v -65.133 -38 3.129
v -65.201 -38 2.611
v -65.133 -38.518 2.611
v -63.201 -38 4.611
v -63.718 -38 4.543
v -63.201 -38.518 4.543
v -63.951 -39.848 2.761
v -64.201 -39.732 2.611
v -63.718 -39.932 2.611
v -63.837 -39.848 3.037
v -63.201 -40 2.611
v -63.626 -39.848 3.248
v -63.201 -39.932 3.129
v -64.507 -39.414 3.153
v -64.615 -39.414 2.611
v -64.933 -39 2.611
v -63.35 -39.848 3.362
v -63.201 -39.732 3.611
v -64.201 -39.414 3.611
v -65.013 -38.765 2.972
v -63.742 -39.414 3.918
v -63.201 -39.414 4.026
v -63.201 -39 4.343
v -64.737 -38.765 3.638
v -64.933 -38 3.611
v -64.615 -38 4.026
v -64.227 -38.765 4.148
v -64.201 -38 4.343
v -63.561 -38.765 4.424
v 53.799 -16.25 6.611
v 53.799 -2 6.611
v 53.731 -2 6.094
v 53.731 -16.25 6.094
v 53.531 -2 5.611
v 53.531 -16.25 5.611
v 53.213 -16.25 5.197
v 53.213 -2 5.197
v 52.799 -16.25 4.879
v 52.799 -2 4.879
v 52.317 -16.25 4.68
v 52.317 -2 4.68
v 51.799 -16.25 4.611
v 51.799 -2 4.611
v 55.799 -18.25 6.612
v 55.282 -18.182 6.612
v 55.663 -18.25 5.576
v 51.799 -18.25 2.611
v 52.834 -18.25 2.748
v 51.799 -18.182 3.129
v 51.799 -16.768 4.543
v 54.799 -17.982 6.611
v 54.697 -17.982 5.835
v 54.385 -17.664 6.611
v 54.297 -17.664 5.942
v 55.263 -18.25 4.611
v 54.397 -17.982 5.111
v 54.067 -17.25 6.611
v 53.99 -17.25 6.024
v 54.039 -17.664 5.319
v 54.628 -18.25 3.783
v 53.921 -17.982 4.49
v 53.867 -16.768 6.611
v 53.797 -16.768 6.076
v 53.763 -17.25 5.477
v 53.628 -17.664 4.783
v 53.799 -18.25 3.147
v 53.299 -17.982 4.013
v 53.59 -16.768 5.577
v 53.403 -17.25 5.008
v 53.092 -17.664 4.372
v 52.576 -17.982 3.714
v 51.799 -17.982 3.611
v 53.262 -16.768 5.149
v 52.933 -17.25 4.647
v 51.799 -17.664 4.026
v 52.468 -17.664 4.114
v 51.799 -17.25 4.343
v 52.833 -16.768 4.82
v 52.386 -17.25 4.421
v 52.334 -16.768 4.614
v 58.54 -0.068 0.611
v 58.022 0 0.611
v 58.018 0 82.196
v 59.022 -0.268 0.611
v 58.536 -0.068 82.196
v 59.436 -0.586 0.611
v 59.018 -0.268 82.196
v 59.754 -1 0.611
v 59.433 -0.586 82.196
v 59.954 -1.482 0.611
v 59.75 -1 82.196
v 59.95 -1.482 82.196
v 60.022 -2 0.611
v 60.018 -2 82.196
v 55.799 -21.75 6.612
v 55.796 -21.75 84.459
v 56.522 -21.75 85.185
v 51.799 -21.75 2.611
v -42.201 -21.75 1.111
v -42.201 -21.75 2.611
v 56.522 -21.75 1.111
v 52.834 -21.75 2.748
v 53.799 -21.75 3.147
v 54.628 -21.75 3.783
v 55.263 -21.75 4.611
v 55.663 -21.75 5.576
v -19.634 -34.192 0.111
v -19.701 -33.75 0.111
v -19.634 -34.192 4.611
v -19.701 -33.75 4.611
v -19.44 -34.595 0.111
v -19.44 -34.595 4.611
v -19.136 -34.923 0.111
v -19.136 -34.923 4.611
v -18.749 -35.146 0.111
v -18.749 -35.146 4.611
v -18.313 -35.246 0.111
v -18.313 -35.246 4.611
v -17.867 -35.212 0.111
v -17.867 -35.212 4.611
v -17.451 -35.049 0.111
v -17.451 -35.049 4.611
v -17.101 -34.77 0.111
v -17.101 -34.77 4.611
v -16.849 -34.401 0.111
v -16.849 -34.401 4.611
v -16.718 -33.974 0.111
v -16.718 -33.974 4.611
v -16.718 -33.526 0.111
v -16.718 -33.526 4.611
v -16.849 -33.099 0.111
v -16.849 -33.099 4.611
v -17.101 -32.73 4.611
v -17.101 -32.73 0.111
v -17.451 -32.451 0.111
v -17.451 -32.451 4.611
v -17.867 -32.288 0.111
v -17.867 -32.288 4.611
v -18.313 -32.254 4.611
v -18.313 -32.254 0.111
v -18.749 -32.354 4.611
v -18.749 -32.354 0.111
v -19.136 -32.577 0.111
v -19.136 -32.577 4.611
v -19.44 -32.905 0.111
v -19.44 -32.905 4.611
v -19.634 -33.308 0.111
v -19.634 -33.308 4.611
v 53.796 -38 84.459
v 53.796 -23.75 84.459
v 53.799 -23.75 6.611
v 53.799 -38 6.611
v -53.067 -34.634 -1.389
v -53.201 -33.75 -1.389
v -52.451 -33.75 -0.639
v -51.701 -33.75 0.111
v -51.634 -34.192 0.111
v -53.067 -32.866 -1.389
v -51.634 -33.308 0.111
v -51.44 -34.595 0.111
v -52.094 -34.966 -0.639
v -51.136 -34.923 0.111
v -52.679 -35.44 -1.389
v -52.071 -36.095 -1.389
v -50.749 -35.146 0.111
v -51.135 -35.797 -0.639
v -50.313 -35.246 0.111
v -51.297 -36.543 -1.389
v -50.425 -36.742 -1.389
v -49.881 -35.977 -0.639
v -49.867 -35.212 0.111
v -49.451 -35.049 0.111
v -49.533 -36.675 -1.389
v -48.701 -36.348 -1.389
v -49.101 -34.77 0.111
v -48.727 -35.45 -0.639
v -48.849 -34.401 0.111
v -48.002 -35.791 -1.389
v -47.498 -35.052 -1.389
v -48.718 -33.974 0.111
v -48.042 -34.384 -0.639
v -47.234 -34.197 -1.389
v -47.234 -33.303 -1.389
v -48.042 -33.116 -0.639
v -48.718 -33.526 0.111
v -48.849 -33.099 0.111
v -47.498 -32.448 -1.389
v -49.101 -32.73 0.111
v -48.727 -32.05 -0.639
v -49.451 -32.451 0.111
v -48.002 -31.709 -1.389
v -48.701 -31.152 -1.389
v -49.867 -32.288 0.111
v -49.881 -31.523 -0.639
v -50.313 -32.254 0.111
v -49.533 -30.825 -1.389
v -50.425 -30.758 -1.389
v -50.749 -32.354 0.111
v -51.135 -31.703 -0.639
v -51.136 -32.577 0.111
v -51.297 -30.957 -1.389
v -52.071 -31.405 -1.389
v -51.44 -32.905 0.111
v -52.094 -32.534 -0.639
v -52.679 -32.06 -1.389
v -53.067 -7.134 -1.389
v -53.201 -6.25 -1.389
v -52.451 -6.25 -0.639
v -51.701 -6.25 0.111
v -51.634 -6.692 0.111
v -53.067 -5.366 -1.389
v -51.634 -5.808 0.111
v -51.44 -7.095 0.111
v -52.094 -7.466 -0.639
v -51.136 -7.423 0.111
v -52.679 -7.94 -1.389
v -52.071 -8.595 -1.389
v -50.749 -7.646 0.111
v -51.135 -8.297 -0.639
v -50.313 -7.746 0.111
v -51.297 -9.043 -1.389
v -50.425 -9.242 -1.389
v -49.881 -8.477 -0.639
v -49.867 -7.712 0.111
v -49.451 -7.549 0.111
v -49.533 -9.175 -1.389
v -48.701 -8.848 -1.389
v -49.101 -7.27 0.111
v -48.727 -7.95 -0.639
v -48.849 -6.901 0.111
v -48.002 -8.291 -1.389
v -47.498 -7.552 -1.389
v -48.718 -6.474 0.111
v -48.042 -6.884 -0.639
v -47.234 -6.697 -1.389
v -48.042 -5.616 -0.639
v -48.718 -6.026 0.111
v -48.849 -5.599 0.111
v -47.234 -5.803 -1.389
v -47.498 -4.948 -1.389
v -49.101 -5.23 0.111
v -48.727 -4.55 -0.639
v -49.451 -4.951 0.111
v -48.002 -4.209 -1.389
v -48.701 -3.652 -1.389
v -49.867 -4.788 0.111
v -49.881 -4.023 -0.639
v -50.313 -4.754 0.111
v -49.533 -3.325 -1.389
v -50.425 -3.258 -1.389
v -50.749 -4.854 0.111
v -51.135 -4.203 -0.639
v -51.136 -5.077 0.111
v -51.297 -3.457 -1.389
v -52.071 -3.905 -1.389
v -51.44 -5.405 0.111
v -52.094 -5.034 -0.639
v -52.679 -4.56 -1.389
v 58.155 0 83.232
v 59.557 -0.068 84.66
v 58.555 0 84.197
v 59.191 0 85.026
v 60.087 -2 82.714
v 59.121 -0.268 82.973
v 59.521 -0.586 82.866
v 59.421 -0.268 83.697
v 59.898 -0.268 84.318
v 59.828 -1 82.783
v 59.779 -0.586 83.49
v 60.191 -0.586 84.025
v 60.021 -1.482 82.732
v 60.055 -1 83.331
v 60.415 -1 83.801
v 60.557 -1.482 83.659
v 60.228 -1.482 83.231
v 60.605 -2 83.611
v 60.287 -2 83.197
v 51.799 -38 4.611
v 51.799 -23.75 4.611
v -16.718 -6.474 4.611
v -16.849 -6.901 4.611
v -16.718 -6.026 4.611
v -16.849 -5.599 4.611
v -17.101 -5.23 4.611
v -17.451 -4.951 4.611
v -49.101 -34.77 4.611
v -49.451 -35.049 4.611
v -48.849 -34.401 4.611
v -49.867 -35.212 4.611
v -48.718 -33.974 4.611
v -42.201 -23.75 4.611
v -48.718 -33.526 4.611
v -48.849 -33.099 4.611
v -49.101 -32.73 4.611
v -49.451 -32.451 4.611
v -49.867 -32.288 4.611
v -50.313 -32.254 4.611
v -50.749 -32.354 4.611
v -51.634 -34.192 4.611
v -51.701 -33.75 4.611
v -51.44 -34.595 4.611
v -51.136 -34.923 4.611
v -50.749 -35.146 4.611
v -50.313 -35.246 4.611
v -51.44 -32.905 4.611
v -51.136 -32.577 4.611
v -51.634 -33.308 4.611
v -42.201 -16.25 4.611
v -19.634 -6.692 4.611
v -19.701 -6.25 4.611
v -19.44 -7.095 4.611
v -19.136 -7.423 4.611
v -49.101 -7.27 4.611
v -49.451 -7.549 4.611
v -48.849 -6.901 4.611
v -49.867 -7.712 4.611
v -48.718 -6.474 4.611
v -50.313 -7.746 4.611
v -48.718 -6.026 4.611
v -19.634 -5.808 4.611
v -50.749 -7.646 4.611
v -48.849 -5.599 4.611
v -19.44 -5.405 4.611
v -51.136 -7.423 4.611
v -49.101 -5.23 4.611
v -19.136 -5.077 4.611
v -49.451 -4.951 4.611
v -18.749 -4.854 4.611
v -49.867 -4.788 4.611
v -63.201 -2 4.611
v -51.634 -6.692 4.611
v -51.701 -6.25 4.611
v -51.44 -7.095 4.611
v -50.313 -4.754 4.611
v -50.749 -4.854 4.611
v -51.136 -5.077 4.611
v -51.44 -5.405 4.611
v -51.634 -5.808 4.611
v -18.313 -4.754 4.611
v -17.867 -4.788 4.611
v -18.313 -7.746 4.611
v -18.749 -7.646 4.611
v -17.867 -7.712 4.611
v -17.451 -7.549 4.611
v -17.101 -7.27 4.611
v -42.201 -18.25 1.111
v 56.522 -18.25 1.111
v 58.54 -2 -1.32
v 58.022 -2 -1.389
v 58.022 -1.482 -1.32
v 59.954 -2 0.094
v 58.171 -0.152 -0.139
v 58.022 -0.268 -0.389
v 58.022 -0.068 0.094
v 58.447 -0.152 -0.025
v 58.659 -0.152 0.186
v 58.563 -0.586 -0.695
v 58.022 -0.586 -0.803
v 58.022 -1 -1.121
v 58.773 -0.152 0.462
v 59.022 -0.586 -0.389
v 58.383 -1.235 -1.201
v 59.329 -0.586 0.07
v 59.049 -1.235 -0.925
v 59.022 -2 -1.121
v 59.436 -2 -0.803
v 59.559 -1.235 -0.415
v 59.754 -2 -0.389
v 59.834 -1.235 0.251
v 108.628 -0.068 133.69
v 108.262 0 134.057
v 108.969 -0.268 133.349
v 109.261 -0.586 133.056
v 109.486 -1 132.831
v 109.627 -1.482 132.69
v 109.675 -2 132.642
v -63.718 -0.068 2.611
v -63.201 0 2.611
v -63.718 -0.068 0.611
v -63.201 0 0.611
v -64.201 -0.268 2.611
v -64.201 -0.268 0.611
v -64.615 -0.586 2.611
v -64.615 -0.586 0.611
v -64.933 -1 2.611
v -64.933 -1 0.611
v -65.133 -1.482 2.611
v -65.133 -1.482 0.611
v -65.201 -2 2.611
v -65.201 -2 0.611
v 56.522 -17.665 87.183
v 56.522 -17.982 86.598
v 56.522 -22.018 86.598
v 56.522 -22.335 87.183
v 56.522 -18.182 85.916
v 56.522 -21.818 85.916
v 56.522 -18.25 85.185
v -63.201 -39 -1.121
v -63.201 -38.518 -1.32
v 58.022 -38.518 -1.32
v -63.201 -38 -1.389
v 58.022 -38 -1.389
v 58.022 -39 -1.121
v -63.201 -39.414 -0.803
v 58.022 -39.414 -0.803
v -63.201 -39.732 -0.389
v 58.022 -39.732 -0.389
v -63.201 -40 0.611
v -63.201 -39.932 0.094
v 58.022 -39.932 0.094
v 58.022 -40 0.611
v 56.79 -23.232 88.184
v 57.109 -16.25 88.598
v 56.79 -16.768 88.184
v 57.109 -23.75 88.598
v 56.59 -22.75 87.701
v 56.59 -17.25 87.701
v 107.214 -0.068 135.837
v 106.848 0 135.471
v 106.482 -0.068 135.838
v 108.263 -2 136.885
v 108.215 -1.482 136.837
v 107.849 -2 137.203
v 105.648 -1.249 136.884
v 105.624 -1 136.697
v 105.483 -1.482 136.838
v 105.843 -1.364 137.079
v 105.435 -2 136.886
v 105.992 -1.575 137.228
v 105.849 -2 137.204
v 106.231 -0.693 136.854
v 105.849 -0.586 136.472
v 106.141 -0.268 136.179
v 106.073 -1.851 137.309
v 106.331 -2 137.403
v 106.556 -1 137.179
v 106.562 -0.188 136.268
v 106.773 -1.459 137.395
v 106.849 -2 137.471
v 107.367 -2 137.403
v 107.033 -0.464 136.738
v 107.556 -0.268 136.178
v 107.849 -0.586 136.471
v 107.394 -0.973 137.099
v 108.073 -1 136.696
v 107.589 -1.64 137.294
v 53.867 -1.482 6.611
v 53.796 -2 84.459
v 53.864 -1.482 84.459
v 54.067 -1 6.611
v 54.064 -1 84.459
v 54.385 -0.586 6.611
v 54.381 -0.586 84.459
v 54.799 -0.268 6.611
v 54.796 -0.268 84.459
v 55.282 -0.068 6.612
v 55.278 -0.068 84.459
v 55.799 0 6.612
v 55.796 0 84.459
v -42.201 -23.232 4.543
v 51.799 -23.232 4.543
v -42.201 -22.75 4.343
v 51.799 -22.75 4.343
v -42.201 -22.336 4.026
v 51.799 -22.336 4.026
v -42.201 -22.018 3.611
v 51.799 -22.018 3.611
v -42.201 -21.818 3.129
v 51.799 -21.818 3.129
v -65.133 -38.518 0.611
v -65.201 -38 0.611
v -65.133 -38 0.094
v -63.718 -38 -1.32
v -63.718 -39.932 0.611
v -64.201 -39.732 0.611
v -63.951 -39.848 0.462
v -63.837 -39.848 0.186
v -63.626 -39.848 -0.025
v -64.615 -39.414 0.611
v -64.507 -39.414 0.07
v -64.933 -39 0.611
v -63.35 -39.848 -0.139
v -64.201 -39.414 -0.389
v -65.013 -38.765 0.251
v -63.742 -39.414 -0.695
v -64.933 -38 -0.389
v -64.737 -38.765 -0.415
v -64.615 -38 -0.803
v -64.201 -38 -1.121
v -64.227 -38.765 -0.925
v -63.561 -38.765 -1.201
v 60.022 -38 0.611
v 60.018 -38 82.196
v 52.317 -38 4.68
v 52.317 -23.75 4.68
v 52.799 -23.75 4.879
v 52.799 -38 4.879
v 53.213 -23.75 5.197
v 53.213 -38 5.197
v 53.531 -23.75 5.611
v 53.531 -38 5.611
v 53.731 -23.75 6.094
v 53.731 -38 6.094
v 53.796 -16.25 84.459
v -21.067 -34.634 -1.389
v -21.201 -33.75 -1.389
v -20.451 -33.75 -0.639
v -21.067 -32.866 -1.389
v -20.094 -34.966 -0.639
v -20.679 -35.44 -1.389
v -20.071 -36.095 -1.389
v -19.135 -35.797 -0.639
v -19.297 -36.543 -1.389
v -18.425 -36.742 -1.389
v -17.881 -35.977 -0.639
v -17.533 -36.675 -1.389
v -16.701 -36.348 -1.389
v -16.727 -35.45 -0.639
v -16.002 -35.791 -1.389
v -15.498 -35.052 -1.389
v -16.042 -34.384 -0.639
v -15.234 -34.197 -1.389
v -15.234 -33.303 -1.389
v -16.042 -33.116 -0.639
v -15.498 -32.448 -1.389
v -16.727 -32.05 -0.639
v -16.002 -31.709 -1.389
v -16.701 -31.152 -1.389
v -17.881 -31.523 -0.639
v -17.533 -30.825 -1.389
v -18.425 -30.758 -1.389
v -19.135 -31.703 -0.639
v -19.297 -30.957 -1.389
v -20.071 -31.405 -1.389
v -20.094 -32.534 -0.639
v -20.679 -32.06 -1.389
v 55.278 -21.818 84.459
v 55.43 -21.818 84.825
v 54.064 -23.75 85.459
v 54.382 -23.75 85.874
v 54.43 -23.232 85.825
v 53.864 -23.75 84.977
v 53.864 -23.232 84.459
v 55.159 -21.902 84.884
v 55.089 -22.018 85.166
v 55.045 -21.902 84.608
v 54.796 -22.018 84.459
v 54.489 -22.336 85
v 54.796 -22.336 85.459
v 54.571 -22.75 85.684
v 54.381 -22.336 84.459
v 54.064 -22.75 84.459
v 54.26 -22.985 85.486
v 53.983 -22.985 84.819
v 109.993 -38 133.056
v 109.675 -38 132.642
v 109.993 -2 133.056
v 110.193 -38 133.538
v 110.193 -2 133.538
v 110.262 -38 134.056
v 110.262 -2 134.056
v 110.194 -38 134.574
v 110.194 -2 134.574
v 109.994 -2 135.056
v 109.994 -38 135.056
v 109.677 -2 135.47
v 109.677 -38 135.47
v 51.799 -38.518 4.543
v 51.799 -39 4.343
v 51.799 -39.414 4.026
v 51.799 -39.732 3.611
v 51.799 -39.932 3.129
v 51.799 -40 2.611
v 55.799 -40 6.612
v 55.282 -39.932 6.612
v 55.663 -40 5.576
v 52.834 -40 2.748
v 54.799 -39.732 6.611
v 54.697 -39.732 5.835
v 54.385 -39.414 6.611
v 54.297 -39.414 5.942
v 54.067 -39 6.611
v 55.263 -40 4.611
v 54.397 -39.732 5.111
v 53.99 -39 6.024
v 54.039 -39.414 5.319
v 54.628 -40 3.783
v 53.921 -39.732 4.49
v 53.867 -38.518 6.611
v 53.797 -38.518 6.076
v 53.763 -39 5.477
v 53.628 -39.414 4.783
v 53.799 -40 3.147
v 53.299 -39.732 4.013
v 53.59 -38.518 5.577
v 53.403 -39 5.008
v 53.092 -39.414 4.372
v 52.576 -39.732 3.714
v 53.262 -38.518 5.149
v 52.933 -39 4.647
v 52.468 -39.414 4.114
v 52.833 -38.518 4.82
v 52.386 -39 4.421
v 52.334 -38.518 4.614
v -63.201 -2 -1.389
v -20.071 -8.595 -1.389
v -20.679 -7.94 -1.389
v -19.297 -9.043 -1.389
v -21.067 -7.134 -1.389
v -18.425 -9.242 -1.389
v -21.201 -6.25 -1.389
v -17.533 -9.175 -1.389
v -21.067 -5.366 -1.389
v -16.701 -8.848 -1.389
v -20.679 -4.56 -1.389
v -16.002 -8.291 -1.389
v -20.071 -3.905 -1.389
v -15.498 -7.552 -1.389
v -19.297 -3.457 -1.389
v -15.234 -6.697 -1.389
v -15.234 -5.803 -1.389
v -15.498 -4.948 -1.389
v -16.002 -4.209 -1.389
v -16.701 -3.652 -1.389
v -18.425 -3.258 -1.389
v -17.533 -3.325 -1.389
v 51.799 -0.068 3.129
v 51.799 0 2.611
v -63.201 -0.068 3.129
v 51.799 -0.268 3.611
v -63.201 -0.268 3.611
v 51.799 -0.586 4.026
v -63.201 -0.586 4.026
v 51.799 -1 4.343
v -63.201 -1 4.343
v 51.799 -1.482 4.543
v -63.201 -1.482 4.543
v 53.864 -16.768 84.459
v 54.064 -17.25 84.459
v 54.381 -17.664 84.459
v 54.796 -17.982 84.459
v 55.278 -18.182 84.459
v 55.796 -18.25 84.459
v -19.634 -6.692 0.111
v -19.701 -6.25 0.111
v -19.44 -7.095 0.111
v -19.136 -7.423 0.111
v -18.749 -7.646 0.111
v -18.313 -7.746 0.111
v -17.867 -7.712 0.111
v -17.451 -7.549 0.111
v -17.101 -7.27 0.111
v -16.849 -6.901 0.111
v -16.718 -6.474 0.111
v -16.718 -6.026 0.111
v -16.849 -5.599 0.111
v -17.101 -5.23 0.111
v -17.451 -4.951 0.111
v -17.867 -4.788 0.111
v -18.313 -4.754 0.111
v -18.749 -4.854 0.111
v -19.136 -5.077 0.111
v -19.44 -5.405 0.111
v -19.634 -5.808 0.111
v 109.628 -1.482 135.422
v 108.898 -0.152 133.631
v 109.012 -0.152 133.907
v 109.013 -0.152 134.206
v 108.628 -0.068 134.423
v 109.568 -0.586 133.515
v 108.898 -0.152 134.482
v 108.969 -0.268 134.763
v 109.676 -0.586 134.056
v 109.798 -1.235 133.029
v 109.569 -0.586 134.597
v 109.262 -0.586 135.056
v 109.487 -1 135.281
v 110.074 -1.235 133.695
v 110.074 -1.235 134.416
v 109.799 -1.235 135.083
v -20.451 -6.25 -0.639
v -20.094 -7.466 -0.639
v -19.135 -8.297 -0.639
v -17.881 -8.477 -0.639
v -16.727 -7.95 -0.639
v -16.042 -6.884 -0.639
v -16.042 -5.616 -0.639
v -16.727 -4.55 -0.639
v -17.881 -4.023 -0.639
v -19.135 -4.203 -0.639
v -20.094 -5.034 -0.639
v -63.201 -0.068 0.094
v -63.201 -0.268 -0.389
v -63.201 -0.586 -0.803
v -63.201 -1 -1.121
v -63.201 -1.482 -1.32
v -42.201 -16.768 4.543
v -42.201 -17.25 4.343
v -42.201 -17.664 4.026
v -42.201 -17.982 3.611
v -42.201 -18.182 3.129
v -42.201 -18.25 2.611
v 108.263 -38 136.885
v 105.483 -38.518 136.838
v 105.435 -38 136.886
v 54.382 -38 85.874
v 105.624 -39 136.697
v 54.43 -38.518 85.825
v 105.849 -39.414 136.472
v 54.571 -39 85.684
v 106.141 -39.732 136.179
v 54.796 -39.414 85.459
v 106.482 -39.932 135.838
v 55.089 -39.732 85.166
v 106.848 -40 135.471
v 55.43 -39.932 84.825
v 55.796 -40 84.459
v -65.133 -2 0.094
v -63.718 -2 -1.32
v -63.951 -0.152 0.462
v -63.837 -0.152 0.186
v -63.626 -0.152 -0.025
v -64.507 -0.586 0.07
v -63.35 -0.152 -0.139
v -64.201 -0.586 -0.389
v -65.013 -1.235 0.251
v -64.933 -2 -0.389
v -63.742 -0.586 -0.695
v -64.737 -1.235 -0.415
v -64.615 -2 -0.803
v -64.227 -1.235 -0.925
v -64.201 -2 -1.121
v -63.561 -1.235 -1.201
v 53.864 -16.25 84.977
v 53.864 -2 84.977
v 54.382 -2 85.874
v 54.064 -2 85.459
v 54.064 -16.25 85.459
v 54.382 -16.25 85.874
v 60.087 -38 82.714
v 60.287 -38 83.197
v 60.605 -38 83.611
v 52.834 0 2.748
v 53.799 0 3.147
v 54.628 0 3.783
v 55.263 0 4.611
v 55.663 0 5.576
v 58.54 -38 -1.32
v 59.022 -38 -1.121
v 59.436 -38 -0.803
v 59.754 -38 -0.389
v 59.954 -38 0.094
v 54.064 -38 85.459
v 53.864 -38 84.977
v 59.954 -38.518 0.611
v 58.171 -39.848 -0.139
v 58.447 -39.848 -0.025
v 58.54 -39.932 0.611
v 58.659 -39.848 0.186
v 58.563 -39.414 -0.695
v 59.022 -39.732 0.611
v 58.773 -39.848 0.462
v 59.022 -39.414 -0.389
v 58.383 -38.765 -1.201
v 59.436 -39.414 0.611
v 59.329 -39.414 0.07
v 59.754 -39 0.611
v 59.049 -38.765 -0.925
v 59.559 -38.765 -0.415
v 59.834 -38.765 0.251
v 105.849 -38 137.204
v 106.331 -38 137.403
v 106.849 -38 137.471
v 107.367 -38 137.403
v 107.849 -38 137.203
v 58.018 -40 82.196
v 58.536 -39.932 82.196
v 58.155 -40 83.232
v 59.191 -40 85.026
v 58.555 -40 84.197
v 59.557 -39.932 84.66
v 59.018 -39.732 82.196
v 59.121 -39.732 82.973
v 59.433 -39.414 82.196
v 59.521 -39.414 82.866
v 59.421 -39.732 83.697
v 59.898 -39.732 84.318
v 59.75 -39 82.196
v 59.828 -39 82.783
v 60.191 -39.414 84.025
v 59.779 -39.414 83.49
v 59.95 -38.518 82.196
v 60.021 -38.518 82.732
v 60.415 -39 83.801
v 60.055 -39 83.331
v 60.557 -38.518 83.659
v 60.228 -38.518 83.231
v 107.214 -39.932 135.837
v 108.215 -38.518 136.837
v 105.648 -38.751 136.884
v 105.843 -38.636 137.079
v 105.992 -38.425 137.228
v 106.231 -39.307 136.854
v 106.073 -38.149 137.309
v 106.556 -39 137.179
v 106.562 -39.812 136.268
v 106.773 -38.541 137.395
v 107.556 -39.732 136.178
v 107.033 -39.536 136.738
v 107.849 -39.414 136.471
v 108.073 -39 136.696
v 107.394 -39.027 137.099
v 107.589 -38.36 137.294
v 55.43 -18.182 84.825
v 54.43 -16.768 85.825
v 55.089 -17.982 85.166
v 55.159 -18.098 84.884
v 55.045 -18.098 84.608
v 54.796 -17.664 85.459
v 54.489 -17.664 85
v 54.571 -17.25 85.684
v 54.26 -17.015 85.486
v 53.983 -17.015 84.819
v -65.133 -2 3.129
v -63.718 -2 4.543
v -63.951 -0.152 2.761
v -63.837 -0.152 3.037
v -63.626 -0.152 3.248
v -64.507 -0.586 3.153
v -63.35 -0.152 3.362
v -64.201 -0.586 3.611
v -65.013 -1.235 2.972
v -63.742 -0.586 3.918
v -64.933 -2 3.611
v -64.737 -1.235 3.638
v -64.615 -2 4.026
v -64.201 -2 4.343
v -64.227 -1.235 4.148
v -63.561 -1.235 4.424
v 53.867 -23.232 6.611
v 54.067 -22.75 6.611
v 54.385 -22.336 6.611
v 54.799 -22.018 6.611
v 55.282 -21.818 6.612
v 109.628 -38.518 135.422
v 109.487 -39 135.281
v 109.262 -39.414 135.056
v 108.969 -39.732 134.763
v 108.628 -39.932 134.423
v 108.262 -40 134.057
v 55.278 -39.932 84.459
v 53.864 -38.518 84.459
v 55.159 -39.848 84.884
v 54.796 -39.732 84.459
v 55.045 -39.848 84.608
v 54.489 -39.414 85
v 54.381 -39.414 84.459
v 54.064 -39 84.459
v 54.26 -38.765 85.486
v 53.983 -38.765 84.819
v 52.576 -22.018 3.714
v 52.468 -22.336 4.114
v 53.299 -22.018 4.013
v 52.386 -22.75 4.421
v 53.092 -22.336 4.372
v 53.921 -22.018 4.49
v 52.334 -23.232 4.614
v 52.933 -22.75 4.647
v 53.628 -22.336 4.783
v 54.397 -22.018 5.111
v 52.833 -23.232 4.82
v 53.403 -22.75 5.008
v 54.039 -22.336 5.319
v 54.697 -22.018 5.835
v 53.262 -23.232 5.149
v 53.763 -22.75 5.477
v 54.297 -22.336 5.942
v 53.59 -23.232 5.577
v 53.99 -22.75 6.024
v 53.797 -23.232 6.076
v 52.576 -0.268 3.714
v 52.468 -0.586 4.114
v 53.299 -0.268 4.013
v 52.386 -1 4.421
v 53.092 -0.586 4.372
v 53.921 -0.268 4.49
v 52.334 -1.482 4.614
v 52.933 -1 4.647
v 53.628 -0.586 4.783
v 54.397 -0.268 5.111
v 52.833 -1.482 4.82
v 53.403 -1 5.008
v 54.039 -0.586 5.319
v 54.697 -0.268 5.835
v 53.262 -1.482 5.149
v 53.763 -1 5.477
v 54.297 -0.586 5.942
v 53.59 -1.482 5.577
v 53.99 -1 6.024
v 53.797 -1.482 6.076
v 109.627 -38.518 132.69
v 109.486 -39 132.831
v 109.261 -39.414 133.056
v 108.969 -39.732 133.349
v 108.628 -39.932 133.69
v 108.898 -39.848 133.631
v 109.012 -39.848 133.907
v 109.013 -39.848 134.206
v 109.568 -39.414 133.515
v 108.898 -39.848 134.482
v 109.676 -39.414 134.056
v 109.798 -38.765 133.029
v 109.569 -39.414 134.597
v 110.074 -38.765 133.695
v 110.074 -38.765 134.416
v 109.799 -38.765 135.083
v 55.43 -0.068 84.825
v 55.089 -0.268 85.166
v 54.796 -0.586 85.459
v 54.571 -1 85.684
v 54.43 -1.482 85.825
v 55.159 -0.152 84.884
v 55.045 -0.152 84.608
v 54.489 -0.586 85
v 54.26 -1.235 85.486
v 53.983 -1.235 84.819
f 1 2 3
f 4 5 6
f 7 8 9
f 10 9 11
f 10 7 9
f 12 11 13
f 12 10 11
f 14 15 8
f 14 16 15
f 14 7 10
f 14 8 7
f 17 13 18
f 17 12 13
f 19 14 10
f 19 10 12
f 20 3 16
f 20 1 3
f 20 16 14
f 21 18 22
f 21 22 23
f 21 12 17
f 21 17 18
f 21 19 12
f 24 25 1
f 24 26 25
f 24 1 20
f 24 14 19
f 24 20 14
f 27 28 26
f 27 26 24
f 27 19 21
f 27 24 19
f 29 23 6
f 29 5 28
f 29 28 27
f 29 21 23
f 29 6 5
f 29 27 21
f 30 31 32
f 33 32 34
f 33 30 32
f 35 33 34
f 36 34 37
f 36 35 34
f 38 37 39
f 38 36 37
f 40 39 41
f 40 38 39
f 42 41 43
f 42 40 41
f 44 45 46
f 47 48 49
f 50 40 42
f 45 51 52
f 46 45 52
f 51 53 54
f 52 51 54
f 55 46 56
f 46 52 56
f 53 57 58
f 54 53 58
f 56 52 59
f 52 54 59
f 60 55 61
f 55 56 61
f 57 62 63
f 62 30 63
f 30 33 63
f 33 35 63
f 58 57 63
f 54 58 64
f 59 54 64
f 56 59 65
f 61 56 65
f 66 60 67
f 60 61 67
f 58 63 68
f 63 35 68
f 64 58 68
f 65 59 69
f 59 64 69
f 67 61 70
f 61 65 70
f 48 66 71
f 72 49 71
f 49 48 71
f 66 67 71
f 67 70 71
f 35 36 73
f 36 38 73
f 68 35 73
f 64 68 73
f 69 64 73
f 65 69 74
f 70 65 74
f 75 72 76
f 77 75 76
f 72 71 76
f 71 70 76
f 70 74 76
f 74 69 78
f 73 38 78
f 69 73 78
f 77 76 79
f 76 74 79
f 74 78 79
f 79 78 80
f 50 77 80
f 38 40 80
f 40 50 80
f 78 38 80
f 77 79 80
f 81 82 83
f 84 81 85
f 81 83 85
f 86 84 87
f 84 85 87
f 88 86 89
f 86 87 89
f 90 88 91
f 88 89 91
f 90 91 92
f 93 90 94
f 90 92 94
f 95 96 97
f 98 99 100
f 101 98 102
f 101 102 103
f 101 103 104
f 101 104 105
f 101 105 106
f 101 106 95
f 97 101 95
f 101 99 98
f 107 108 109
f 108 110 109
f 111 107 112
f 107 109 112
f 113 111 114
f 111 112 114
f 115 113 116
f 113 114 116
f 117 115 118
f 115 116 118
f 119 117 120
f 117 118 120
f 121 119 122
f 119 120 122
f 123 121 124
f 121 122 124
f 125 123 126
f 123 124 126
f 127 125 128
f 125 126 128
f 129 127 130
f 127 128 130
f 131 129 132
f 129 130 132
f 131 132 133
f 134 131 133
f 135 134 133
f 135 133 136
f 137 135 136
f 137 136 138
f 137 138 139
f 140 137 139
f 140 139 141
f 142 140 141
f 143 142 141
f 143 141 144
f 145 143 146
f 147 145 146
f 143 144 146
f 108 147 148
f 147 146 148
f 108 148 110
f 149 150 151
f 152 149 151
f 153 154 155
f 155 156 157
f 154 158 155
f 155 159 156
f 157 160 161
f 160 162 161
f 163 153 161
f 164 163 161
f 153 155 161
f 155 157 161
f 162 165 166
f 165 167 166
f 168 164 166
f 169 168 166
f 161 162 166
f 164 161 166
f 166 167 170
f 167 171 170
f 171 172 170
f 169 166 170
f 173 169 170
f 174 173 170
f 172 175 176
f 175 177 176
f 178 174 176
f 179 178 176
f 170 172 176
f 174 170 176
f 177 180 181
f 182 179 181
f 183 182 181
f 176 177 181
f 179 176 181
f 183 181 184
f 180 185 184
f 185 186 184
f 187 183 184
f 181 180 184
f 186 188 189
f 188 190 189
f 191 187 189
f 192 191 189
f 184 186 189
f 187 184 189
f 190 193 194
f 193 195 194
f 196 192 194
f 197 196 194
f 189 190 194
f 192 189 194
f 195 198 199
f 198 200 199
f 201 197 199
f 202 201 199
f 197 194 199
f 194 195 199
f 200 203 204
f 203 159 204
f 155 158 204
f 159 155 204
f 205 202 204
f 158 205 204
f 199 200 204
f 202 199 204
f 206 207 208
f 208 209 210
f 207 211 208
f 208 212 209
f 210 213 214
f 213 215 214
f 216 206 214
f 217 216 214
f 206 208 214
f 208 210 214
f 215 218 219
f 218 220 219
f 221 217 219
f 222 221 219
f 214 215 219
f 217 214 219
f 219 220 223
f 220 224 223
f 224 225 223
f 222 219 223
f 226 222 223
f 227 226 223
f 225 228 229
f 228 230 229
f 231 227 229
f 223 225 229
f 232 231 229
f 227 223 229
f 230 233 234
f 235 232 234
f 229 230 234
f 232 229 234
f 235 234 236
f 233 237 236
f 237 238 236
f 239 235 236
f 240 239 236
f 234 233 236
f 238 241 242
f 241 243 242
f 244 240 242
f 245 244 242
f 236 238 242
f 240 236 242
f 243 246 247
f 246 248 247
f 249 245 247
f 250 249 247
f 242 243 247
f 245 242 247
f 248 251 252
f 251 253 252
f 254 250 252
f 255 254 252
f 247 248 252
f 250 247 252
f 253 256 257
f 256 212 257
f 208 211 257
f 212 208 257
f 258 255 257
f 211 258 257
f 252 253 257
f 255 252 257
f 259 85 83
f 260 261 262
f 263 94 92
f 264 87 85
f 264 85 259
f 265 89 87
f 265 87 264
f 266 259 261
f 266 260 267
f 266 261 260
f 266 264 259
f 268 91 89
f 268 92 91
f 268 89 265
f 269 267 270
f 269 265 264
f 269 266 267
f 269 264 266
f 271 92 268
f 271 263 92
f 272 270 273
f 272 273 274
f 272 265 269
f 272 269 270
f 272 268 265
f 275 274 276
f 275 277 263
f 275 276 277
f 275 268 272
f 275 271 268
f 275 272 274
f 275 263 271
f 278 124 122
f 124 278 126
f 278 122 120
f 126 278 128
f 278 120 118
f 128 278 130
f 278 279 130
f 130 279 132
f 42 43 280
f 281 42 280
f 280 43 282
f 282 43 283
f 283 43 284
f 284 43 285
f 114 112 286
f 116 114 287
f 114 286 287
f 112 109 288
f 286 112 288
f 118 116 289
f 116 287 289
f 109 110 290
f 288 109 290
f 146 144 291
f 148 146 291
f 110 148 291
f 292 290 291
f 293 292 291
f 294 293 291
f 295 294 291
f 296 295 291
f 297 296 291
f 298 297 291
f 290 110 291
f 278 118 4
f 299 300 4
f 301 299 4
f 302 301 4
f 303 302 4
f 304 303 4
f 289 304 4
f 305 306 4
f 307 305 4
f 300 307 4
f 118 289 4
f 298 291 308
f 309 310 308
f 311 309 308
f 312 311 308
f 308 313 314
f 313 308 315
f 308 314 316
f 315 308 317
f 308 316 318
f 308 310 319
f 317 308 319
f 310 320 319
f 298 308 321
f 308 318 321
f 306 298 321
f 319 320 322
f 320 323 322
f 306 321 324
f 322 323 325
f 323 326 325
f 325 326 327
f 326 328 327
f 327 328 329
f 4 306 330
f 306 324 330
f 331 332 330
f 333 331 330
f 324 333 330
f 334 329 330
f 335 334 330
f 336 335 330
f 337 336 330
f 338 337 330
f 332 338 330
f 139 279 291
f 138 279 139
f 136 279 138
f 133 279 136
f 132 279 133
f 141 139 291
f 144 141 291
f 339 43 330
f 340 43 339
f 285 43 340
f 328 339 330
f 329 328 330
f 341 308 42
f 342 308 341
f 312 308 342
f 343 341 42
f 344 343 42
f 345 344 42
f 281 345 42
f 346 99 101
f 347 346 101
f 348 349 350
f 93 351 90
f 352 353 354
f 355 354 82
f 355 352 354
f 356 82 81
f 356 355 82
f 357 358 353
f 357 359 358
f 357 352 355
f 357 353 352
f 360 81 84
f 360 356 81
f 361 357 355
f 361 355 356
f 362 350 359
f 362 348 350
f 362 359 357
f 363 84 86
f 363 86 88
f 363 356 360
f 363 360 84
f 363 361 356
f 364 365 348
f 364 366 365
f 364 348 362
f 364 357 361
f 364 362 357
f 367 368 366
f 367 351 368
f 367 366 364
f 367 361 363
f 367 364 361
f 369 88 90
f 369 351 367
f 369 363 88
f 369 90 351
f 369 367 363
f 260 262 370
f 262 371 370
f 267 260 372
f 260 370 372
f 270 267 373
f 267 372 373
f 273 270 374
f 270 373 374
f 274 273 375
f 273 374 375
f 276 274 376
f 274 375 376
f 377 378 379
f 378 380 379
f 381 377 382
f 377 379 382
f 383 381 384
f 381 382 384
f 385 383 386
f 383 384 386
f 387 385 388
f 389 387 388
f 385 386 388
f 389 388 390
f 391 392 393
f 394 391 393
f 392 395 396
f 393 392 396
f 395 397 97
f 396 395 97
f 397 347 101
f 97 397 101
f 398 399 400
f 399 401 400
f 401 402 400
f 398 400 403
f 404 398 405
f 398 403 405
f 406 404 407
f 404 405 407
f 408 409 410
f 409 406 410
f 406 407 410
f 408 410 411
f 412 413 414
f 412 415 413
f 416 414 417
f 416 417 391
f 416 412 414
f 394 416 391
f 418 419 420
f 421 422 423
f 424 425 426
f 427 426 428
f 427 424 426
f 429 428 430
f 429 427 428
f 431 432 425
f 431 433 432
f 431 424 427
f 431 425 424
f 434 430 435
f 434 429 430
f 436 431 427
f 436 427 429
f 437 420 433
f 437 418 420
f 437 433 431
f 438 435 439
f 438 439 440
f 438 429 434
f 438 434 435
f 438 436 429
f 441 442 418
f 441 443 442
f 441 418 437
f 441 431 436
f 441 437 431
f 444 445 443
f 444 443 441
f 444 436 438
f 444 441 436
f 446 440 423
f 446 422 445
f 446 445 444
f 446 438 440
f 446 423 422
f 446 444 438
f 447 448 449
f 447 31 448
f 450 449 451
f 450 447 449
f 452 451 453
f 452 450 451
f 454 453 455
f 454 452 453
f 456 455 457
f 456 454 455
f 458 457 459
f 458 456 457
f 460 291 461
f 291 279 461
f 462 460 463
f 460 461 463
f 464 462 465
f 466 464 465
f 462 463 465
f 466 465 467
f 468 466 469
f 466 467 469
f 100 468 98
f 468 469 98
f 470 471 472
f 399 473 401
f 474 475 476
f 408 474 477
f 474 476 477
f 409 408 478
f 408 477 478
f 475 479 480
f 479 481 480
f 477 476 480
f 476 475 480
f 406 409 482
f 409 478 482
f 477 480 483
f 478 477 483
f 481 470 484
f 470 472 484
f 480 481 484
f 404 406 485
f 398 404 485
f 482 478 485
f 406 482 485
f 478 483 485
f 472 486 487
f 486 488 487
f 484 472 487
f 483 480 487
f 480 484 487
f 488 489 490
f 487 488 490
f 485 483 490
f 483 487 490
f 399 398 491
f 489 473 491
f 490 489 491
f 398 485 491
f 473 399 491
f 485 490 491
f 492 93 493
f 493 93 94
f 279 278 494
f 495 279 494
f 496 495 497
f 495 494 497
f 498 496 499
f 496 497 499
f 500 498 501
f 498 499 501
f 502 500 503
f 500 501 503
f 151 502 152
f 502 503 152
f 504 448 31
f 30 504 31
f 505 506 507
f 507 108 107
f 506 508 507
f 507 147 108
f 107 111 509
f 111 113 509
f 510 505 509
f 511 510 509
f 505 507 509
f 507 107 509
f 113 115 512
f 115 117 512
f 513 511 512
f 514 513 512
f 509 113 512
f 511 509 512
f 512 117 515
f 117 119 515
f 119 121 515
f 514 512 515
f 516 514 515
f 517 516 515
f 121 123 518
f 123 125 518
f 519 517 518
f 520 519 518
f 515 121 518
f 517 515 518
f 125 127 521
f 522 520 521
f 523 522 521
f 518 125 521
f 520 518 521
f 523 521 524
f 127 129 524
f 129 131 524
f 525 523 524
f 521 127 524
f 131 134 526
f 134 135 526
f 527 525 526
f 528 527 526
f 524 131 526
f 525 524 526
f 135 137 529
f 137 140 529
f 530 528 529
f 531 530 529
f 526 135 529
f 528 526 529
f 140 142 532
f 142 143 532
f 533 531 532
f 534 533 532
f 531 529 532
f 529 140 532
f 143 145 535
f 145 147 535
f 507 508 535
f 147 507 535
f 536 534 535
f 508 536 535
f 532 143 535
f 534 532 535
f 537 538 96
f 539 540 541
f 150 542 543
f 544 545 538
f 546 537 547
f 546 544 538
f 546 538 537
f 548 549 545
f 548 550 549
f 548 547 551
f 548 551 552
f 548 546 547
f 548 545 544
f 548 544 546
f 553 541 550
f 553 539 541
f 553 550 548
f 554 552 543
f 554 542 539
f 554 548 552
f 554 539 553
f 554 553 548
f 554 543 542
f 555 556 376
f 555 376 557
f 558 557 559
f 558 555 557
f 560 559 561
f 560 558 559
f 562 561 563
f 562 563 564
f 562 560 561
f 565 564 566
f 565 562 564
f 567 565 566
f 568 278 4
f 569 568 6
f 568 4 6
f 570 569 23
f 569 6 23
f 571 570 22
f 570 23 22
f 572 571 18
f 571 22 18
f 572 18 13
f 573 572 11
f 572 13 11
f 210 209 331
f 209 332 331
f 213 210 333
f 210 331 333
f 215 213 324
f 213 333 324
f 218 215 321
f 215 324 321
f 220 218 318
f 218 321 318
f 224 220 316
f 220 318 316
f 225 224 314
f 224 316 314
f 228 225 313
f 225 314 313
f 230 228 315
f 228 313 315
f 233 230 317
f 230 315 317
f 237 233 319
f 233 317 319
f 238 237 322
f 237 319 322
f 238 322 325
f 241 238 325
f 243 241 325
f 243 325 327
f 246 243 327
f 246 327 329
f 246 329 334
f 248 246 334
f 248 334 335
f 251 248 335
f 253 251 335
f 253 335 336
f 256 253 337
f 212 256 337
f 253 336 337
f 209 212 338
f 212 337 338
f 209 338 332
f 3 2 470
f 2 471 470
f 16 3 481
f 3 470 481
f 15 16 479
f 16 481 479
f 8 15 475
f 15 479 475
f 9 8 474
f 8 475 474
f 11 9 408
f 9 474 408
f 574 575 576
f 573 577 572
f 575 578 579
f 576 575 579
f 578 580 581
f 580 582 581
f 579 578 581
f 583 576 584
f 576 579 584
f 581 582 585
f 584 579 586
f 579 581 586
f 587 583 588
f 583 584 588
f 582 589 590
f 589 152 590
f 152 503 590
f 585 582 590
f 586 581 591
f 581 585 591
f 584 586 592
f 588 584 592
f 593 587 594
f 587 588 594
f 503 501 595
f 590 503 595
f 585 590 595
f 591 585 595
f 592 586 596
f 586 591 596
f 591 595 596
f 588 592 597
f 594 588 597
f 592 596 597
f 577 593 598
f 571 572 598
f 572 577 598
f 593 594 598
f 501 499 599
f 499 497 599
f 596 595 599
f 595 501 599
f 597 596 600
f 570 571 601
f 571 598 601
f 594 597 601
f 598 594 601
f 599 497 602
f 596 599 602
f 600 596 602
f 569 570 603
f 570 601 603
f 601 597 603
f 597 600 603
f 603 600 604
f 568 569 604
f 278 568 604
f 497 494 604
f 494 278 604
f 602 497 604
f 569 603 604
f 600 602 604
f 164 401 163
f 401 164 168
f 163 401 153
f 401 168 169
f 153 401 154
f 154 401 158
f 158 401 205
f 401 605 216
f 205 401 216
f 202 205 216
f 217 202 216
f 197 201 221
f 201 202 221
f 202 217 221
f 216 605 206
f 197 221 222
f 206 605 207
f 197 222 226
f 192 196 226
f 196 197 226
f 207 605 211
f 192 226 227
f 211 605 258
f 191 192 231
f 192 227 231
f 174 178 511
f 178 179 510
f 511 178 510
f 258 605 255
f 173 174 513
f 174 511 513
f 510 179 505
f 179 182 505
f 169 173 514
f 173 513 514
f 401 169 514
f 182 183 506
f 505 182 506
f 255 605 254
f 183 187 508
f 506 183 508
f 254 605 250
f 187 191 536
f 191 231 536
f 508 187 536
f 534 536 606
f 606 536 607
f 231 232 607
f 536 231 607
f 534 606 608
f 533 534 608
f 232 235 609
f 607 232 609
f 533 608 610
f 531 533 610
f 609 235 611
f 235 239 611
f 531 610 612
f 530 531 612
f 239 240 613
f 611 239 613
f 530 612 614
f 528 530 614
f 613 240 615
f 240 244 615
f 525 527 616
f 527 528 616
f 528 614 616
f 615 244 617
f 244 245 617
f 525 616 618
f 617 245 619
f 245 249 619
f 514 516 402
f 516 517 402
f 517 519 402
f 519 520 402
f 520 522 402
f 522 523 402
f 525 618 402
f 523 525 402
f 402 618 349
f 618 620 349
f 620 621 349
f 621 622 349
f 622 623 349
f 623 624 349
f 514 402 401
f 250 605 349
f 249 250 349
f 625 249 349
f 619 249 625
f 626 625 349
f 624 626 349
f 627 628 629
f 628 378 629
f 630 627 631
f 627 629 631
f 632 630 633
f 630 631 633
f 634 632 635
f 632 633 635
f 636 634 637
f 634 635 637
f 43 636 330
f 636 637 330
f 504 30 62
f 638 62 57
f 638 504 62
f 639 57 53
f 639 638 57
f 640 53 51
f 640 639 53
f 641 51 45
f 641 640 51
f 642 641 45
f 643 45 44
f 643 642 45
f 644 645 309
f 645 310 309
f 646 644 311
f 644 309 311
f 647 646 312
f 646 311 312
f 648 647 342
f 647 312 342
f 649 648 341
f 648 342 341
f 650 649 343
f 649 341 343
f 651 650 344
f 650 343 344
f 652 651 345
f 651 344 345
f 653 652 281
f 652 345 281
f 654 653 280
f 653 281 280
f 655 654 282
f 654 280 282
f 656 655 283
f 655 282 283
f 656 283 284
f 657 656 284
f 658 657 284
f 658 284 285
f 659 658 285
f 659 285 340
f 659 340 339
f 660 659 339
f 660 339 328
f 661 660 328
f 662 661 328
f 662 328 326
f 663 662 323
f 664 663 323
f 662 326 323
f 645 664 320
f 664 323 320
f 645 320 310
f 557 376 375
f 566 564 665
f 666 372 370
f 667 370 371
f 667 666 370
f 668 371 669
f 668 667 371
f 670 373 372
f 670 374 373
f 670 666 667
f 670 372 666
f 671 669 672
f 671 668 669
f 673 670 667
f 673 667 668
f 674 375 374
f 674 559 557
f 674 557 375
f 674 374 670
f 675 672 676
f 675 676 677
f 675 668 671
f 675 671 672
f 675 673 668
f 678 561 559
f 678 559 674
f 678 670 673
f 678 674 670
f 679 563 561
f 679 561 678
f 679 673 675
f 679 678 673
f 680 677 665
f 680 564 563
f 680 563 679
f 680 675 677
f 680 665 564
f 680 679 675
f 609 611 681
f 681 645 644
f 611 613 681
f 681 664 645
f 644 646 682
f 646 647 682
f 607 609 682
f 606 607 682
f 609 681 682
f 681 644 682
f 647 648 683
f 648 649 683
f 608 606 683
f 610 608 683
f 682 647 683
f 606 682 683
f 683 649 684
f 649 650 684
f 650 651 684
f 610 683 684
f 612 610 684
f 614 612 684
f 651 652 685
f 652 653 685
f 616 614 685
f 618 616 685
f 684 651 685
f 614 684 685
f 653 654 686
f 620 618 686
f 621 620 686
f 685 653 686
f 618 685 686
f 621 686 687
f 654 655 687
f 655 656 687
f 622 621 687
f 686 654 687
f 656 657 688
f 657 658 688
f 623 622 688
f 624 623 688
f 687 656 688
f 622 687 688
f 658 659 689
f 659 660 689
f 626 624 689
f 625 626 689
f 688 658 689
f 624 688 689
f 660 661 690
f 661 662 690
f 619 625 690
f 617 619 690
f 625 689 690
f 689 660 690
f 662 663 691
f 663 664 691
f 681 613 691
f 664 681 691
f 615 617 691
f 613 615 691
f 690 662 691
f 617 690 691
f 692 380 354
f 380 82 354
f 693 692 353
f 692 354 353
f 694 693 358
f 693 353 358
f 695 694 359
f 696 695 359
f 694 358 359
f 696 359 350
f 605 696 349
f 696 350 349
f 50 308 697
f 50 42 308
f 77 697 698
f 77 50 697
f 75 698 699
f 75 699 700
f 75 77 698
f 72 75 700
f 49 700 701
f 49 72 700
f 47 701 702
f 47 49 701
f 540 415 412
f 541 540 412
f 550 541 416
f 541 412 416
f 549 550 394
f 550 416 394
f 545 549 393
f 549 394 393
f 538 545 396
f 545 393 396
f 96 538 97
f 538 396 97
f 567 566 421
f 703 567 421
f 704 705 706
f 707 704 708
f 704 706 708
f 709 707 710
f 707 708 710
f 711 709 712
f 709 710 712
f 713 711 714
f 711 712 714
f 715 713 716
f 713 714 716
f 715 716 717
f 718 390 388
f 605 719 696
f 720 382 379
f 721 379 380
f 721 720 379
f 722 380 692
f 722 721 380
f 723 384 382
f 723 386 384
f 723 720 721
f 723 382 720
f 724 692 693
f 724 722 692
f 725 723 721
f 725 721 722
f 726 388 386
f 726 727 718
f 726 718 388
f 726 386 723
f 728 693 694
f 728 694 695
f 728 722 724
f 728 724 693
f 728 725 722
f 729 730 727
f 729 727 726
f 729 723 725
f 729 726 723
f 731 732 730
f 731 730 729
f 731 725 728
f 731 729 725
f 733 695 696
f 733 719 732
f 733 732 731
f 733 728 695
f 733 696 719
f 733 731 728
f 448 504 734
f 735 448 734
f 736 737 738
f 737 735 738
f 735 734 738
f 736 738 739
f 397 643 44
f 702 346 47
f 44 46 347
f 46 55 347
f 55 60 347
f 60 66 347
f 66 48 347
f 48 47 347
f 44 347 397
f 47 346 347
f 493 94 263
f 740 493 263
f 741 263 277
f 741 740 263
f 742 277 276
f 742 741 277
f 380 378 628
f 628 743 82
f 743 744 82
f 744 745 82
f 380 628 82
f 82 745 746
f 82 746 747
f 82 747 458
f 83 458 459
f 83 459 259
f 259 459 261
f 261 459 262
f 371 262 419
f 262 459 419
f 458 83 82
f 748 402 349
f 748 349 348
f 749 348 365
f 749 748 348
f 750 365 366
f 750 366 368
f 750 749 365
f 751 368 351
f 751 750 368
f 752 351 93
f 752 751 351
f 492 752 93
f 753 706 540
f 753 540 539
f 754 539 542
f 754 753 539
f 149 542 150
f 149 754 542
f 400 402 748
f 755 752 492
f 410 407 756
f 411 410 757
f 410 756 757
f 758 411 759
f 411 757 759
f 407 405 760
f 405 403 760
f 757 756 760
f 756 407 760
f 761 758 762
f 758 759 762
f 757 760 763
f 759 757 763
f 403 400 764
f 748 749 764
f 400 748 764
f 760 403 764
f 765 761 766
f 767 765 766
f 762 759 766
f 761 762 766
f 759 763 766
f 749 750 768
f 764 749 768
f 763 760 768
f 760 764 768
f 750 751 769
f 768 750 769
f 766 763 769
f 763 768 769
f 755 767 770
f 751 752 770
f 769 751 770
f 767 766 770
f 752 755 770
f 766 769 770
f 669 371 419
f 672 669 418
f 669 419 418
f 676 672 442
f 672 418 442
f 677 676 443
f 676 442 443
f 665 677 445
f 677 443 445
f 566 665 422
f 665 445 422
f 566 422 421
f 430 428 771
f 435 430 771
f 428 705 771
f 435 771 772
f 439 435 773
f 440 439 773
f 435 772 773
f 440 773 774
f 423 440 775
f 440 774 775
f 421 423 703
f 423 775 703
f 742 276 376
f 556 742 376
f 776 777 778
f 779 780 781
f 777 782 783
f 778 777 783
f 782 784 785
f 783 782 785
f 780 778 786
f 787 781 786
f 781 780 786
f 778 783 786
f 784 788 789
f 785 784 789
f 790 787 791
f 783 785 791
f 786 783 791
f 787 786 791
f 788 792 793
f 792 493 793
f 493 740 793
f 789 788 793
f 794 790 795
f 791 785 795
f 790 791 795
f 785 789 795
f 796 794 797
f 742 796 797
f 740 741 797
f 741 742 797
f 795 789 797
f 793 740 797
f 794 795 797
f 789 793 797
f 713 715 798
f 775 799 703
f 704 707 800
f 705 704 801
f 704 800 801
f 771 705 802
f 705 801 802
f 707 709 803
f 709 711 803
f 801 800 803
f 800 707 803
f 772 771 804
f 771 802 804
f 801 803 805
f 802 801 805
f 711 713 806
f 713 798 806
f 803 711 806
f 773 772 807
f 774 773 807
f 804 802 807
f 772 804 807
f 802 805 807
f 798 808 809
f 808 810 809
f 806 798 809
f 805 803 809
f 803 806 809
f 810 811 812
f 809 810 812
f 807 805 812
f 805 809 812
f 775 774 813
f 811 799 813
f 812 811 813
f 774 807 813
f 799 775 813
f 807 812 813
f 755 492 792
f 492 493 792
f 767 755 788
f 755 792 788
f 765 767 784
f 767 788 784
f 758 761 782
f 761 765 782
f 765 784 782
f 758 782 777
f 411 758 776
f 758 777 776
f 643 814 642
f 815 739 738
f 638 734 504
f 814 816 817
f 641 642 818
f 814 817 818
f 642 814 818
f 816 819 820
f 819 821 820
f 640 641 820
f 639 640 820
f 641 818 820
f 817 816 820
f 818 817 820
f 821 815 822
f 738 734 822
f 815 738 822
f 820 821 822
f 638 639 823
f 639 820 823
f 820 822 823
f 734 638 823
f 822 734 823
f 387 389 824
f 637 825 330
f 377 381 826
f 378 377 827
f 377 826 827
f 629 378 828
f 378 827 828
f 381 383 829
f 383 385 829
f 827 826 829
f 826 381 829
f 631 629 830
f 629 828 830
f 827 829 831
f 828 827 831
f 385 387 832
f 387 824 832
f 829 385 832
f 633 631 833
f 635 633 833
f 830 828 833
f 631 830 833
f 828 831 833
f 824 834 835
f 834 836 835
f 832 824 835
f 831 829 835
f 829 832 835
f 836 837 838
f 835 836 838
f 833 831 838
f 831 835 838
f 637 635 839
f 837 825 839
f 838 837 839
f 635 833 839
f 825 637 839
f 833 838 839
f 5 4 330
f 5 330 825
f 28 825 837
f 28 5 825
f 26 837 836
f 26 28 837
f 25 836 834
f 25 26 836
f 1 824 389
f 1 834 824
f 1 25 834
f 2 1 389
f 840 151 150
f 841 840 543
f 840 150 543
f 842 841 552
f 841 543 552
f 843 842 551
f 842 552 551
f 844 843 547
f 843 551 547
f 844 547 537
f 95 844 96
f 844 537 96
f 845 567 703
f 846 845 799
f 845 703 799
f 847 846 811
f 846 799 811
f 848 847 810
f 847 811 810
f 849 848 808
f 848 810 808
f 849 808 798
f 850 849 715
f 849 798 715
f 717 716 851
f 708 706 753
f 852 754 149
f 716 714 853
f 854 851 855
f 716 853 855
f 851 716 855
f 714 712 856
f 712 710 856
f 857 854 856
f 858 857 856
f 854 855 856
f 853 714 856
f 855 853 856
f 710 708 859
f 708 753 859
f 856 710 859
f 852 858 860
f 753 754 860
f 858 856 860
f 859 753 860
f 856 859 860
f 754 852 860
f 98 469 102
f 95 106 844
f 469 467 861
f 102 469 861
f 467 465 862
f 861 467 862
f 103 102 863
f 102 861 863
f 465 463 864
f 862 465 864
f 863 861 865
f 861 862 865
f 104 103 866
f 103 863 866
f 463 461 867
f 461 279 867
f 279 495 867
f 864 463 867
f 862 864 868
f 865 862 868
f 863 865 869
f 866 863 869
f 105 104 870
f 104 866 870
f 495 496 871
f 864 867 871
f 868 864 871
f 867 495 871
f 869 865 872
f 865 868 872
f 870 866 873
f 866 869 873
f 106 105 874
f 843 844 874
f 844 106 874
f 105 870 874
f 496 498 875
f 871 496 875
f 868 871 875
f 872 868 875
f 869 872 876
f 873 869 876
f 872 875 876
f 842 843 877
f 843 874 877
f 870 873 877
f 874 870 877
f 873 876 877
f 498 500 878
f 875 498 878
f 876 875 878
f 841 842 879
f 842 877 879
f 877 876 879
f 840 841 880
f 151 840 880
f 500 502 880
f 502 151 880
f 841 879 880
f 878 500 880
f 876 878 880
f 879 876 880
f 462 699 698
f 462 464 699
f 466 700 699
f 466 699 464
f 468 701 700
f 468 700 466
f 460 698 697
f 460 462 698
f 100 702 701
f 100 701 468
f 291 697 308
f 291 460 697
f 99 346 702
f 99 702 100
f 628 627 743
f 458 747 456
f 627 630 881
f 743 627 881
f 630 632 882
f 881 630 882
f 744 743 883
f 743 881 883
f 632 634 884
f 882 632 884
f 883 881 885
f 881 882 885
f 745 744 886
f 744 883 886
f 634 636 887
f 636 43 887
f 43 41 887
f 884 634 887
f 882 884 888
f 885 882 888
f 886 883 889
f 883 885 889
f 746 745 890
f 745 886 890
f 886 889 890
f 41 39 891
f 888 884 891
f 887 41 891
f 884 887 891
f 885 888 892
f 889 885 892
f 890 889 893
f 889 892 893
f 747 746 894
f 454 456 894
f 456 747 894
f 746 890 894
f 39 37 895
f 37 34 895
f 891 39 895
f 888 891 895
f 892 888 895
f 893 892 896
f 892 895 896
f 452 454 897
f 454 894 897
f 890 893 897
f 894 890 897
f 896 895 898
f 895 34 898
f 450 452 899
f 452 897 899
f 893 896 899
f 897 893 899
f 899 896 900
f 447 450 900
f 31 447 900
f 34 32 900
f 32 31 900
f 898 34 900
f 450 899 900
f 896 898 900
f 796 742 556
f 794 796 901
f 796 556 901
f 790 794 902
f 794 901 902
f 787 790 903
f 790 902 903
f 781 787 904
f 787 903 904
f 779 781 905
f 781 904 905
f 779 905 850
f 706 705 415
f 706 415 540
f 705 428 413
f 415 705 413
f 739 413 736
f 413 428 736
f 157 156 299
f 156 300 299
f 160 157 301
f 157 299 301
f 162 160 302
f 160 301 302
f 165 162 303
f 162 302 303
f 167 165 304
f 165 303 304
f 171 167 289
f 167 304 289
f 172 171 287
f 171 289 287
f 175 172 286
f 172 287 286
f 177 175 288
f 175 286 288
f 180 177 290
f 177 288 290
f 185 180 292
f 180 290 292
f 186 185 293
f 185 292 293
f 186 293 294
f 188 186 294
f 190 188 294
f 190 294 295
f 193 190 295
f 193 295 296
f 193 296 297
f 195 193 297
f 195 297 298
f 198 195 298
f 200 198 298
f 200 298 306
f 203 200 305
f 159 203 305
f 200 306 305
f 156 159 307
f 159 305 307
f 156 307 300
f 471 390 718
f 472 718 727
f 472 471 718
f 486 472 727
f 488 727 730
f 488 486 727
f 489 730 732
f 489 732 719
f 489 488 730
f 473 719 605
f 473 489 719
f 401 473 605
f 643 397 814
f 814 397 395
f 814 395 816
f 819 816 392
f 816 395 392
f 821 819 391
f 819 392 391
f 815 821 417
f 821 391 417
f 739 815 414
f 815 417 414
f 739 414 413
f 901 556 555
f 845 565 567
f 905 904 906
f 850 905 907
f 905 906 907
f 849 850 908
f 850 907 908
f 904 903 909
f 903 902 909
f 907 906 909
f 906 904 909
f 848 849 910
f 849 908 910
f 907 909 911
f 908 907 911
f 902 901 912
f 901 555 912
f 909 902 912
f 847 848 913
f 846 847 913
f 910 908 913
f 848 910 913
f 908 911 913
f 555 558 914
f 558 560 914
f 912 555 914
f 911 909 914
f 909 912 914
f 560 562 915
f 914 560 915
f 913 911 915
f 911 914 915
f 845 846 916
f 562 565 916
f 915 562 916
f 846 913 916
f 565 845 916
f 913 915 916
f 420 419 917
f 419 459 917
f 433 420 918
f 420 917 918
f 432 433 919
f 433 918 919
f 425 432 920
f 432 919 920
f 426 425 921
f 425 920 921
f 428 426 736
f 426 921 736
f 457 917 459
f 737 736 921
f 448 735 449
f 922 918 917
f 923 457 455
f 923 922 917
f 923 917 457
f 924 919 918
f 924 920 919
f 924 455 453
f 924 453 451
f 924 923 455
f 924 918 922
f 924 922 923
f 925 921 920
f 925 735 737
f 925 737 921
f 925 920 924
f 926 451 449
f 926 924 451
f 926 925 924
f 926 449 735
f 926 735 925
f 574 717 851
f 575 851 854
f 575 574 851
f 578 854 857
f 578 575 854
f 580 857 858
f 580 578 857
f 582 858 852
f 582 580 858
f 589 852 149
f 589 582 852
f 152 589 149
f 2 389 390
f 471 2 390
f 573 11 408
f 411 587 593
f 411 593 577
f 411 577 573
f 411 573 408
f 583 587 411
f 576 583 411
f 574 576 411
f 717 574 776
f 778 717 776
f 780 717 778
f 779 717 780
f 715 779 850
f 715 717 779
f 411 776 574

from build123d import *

# Parameters (mm, degrees)
F1_DEPTH       = 40
F3_D           = 3
F3_DEPTH       = 40
F3_CSINK_D     = 6
F3_CSINK_ANGLE = 90
F3_TIP         = 0.9012909285
F4_START       = -2.5
F2_W           = 98.723
F2_H           = 3.5
F4_DEPTH       = 98.5
F5_R           = 2


with BuildPart() as f1:
    # F0 (on Front) → F1 (new body)
    with BuildSketch(Plane.XZ):
        Polygon((53.7955448006, 85.2875881677), (53.7992331499, 4.6113628414), (-65.2007668501, 4.6113628414), (-65.2007668501, -1.3886371586), (60.0222331499, -1.3886371586), (60.0183739277, 83.0251359205), (111.0902979443, 134.055520892), (106.8493191704, 138.2998228416), align=None)
    extrude(amount=F1_DEPTH)

    # F3
    with Locations(Plane(origin=(0, 0, -1.3886371586), x_dir=(1, 0, 0), z_dir=(0, 0, -1))):
        with Locations((-50.2007668501, 33.75), (-50.2007668501, 6.25), (-18.2007668501, 6.25), (-18.2007668501, 33.75)):
            CounterSinkHole(F3_D / 2, F3_CSINK_D / 2, depth=F3_DEPTH, counter_sink_angle=F3_CSINK_ANGLE)
            with Locations((0, 0, -(F3_DEPTH + F3_TIP / 2))):  # 118° drill point
                Cone(0, F3_D / 2, F3_TIP, mode=Mode.SUBTRACT)

    # F2 (on face) → F4 (cut)
    with BuildSketch(Plane(origin=(0, 0, -1.3886371586), x_dir=(1, 0, 0), z_dir=(0, 0, -1)).offset(F4_START)):
        with Locations((7.1607331499, 20)):
            Rectangle(F2_W, F2_H)
    extrude(amount=-F4_DEPTH, mode=Mode.SUBTRACT)

    # F5
    f5_edges = [f1.edges().sort_by_distance(p)[0] for p in [
        (53.797389, -21.75, 44.949476),
        (53.799233, -30.875, 4.611363),
        (53.797389, -40, 44.949476),
        (53.795545, -30.875, 85.287588),
        (53.797389, 0, 44.949476),
        (53.799233, -9.125, 4.611363),
        (53.797389, -18.25, 44.949476),
        (53.795545, -9.125, 85.287588),
        (-65.200767, -20, 4.611363),
        (-65.200767, -20, -1.388637),
        (-65.200767, 0, 1.611363),
        (-65.200767, -40, 1.611363),
        (-5.700767, 0, 4.611363),
        (-2.589267, 0, -1.388637),
        (60.020304, 0, 40.818249),
        (85.554336, 0, 108.540328),
        (108.969809, 0, 136.177672),
        (80.322432, 0, 111.793706),
        (-5.700767, -40, 4.611363),
        (-2.589267, -40, -1.388637),
        (60.020304, -40, 40.818249),
        (85.554336, -40, 108.540328),
        (108.969809, -40, 136.177672),
        (80.322432, -40, 111.793706),
        (55.158889, -18.25, 86.649865),
        (56.522233, -20, 88.012142),
        (55.158889, -21.75, 86.649865),
        (106.849319, -20, 138.299823),
        (111.090298, -20, 134.055521),
        (60.022233, -20, -1.388637),
        (60.018374, -20, 83.025136),
        (5.799233, -21.75, 4.611363),
        (5.799233, -18.25, 4.611363),
    ]]
    fillet(f5_edges, radius=F5_R)


solid = f1.part
